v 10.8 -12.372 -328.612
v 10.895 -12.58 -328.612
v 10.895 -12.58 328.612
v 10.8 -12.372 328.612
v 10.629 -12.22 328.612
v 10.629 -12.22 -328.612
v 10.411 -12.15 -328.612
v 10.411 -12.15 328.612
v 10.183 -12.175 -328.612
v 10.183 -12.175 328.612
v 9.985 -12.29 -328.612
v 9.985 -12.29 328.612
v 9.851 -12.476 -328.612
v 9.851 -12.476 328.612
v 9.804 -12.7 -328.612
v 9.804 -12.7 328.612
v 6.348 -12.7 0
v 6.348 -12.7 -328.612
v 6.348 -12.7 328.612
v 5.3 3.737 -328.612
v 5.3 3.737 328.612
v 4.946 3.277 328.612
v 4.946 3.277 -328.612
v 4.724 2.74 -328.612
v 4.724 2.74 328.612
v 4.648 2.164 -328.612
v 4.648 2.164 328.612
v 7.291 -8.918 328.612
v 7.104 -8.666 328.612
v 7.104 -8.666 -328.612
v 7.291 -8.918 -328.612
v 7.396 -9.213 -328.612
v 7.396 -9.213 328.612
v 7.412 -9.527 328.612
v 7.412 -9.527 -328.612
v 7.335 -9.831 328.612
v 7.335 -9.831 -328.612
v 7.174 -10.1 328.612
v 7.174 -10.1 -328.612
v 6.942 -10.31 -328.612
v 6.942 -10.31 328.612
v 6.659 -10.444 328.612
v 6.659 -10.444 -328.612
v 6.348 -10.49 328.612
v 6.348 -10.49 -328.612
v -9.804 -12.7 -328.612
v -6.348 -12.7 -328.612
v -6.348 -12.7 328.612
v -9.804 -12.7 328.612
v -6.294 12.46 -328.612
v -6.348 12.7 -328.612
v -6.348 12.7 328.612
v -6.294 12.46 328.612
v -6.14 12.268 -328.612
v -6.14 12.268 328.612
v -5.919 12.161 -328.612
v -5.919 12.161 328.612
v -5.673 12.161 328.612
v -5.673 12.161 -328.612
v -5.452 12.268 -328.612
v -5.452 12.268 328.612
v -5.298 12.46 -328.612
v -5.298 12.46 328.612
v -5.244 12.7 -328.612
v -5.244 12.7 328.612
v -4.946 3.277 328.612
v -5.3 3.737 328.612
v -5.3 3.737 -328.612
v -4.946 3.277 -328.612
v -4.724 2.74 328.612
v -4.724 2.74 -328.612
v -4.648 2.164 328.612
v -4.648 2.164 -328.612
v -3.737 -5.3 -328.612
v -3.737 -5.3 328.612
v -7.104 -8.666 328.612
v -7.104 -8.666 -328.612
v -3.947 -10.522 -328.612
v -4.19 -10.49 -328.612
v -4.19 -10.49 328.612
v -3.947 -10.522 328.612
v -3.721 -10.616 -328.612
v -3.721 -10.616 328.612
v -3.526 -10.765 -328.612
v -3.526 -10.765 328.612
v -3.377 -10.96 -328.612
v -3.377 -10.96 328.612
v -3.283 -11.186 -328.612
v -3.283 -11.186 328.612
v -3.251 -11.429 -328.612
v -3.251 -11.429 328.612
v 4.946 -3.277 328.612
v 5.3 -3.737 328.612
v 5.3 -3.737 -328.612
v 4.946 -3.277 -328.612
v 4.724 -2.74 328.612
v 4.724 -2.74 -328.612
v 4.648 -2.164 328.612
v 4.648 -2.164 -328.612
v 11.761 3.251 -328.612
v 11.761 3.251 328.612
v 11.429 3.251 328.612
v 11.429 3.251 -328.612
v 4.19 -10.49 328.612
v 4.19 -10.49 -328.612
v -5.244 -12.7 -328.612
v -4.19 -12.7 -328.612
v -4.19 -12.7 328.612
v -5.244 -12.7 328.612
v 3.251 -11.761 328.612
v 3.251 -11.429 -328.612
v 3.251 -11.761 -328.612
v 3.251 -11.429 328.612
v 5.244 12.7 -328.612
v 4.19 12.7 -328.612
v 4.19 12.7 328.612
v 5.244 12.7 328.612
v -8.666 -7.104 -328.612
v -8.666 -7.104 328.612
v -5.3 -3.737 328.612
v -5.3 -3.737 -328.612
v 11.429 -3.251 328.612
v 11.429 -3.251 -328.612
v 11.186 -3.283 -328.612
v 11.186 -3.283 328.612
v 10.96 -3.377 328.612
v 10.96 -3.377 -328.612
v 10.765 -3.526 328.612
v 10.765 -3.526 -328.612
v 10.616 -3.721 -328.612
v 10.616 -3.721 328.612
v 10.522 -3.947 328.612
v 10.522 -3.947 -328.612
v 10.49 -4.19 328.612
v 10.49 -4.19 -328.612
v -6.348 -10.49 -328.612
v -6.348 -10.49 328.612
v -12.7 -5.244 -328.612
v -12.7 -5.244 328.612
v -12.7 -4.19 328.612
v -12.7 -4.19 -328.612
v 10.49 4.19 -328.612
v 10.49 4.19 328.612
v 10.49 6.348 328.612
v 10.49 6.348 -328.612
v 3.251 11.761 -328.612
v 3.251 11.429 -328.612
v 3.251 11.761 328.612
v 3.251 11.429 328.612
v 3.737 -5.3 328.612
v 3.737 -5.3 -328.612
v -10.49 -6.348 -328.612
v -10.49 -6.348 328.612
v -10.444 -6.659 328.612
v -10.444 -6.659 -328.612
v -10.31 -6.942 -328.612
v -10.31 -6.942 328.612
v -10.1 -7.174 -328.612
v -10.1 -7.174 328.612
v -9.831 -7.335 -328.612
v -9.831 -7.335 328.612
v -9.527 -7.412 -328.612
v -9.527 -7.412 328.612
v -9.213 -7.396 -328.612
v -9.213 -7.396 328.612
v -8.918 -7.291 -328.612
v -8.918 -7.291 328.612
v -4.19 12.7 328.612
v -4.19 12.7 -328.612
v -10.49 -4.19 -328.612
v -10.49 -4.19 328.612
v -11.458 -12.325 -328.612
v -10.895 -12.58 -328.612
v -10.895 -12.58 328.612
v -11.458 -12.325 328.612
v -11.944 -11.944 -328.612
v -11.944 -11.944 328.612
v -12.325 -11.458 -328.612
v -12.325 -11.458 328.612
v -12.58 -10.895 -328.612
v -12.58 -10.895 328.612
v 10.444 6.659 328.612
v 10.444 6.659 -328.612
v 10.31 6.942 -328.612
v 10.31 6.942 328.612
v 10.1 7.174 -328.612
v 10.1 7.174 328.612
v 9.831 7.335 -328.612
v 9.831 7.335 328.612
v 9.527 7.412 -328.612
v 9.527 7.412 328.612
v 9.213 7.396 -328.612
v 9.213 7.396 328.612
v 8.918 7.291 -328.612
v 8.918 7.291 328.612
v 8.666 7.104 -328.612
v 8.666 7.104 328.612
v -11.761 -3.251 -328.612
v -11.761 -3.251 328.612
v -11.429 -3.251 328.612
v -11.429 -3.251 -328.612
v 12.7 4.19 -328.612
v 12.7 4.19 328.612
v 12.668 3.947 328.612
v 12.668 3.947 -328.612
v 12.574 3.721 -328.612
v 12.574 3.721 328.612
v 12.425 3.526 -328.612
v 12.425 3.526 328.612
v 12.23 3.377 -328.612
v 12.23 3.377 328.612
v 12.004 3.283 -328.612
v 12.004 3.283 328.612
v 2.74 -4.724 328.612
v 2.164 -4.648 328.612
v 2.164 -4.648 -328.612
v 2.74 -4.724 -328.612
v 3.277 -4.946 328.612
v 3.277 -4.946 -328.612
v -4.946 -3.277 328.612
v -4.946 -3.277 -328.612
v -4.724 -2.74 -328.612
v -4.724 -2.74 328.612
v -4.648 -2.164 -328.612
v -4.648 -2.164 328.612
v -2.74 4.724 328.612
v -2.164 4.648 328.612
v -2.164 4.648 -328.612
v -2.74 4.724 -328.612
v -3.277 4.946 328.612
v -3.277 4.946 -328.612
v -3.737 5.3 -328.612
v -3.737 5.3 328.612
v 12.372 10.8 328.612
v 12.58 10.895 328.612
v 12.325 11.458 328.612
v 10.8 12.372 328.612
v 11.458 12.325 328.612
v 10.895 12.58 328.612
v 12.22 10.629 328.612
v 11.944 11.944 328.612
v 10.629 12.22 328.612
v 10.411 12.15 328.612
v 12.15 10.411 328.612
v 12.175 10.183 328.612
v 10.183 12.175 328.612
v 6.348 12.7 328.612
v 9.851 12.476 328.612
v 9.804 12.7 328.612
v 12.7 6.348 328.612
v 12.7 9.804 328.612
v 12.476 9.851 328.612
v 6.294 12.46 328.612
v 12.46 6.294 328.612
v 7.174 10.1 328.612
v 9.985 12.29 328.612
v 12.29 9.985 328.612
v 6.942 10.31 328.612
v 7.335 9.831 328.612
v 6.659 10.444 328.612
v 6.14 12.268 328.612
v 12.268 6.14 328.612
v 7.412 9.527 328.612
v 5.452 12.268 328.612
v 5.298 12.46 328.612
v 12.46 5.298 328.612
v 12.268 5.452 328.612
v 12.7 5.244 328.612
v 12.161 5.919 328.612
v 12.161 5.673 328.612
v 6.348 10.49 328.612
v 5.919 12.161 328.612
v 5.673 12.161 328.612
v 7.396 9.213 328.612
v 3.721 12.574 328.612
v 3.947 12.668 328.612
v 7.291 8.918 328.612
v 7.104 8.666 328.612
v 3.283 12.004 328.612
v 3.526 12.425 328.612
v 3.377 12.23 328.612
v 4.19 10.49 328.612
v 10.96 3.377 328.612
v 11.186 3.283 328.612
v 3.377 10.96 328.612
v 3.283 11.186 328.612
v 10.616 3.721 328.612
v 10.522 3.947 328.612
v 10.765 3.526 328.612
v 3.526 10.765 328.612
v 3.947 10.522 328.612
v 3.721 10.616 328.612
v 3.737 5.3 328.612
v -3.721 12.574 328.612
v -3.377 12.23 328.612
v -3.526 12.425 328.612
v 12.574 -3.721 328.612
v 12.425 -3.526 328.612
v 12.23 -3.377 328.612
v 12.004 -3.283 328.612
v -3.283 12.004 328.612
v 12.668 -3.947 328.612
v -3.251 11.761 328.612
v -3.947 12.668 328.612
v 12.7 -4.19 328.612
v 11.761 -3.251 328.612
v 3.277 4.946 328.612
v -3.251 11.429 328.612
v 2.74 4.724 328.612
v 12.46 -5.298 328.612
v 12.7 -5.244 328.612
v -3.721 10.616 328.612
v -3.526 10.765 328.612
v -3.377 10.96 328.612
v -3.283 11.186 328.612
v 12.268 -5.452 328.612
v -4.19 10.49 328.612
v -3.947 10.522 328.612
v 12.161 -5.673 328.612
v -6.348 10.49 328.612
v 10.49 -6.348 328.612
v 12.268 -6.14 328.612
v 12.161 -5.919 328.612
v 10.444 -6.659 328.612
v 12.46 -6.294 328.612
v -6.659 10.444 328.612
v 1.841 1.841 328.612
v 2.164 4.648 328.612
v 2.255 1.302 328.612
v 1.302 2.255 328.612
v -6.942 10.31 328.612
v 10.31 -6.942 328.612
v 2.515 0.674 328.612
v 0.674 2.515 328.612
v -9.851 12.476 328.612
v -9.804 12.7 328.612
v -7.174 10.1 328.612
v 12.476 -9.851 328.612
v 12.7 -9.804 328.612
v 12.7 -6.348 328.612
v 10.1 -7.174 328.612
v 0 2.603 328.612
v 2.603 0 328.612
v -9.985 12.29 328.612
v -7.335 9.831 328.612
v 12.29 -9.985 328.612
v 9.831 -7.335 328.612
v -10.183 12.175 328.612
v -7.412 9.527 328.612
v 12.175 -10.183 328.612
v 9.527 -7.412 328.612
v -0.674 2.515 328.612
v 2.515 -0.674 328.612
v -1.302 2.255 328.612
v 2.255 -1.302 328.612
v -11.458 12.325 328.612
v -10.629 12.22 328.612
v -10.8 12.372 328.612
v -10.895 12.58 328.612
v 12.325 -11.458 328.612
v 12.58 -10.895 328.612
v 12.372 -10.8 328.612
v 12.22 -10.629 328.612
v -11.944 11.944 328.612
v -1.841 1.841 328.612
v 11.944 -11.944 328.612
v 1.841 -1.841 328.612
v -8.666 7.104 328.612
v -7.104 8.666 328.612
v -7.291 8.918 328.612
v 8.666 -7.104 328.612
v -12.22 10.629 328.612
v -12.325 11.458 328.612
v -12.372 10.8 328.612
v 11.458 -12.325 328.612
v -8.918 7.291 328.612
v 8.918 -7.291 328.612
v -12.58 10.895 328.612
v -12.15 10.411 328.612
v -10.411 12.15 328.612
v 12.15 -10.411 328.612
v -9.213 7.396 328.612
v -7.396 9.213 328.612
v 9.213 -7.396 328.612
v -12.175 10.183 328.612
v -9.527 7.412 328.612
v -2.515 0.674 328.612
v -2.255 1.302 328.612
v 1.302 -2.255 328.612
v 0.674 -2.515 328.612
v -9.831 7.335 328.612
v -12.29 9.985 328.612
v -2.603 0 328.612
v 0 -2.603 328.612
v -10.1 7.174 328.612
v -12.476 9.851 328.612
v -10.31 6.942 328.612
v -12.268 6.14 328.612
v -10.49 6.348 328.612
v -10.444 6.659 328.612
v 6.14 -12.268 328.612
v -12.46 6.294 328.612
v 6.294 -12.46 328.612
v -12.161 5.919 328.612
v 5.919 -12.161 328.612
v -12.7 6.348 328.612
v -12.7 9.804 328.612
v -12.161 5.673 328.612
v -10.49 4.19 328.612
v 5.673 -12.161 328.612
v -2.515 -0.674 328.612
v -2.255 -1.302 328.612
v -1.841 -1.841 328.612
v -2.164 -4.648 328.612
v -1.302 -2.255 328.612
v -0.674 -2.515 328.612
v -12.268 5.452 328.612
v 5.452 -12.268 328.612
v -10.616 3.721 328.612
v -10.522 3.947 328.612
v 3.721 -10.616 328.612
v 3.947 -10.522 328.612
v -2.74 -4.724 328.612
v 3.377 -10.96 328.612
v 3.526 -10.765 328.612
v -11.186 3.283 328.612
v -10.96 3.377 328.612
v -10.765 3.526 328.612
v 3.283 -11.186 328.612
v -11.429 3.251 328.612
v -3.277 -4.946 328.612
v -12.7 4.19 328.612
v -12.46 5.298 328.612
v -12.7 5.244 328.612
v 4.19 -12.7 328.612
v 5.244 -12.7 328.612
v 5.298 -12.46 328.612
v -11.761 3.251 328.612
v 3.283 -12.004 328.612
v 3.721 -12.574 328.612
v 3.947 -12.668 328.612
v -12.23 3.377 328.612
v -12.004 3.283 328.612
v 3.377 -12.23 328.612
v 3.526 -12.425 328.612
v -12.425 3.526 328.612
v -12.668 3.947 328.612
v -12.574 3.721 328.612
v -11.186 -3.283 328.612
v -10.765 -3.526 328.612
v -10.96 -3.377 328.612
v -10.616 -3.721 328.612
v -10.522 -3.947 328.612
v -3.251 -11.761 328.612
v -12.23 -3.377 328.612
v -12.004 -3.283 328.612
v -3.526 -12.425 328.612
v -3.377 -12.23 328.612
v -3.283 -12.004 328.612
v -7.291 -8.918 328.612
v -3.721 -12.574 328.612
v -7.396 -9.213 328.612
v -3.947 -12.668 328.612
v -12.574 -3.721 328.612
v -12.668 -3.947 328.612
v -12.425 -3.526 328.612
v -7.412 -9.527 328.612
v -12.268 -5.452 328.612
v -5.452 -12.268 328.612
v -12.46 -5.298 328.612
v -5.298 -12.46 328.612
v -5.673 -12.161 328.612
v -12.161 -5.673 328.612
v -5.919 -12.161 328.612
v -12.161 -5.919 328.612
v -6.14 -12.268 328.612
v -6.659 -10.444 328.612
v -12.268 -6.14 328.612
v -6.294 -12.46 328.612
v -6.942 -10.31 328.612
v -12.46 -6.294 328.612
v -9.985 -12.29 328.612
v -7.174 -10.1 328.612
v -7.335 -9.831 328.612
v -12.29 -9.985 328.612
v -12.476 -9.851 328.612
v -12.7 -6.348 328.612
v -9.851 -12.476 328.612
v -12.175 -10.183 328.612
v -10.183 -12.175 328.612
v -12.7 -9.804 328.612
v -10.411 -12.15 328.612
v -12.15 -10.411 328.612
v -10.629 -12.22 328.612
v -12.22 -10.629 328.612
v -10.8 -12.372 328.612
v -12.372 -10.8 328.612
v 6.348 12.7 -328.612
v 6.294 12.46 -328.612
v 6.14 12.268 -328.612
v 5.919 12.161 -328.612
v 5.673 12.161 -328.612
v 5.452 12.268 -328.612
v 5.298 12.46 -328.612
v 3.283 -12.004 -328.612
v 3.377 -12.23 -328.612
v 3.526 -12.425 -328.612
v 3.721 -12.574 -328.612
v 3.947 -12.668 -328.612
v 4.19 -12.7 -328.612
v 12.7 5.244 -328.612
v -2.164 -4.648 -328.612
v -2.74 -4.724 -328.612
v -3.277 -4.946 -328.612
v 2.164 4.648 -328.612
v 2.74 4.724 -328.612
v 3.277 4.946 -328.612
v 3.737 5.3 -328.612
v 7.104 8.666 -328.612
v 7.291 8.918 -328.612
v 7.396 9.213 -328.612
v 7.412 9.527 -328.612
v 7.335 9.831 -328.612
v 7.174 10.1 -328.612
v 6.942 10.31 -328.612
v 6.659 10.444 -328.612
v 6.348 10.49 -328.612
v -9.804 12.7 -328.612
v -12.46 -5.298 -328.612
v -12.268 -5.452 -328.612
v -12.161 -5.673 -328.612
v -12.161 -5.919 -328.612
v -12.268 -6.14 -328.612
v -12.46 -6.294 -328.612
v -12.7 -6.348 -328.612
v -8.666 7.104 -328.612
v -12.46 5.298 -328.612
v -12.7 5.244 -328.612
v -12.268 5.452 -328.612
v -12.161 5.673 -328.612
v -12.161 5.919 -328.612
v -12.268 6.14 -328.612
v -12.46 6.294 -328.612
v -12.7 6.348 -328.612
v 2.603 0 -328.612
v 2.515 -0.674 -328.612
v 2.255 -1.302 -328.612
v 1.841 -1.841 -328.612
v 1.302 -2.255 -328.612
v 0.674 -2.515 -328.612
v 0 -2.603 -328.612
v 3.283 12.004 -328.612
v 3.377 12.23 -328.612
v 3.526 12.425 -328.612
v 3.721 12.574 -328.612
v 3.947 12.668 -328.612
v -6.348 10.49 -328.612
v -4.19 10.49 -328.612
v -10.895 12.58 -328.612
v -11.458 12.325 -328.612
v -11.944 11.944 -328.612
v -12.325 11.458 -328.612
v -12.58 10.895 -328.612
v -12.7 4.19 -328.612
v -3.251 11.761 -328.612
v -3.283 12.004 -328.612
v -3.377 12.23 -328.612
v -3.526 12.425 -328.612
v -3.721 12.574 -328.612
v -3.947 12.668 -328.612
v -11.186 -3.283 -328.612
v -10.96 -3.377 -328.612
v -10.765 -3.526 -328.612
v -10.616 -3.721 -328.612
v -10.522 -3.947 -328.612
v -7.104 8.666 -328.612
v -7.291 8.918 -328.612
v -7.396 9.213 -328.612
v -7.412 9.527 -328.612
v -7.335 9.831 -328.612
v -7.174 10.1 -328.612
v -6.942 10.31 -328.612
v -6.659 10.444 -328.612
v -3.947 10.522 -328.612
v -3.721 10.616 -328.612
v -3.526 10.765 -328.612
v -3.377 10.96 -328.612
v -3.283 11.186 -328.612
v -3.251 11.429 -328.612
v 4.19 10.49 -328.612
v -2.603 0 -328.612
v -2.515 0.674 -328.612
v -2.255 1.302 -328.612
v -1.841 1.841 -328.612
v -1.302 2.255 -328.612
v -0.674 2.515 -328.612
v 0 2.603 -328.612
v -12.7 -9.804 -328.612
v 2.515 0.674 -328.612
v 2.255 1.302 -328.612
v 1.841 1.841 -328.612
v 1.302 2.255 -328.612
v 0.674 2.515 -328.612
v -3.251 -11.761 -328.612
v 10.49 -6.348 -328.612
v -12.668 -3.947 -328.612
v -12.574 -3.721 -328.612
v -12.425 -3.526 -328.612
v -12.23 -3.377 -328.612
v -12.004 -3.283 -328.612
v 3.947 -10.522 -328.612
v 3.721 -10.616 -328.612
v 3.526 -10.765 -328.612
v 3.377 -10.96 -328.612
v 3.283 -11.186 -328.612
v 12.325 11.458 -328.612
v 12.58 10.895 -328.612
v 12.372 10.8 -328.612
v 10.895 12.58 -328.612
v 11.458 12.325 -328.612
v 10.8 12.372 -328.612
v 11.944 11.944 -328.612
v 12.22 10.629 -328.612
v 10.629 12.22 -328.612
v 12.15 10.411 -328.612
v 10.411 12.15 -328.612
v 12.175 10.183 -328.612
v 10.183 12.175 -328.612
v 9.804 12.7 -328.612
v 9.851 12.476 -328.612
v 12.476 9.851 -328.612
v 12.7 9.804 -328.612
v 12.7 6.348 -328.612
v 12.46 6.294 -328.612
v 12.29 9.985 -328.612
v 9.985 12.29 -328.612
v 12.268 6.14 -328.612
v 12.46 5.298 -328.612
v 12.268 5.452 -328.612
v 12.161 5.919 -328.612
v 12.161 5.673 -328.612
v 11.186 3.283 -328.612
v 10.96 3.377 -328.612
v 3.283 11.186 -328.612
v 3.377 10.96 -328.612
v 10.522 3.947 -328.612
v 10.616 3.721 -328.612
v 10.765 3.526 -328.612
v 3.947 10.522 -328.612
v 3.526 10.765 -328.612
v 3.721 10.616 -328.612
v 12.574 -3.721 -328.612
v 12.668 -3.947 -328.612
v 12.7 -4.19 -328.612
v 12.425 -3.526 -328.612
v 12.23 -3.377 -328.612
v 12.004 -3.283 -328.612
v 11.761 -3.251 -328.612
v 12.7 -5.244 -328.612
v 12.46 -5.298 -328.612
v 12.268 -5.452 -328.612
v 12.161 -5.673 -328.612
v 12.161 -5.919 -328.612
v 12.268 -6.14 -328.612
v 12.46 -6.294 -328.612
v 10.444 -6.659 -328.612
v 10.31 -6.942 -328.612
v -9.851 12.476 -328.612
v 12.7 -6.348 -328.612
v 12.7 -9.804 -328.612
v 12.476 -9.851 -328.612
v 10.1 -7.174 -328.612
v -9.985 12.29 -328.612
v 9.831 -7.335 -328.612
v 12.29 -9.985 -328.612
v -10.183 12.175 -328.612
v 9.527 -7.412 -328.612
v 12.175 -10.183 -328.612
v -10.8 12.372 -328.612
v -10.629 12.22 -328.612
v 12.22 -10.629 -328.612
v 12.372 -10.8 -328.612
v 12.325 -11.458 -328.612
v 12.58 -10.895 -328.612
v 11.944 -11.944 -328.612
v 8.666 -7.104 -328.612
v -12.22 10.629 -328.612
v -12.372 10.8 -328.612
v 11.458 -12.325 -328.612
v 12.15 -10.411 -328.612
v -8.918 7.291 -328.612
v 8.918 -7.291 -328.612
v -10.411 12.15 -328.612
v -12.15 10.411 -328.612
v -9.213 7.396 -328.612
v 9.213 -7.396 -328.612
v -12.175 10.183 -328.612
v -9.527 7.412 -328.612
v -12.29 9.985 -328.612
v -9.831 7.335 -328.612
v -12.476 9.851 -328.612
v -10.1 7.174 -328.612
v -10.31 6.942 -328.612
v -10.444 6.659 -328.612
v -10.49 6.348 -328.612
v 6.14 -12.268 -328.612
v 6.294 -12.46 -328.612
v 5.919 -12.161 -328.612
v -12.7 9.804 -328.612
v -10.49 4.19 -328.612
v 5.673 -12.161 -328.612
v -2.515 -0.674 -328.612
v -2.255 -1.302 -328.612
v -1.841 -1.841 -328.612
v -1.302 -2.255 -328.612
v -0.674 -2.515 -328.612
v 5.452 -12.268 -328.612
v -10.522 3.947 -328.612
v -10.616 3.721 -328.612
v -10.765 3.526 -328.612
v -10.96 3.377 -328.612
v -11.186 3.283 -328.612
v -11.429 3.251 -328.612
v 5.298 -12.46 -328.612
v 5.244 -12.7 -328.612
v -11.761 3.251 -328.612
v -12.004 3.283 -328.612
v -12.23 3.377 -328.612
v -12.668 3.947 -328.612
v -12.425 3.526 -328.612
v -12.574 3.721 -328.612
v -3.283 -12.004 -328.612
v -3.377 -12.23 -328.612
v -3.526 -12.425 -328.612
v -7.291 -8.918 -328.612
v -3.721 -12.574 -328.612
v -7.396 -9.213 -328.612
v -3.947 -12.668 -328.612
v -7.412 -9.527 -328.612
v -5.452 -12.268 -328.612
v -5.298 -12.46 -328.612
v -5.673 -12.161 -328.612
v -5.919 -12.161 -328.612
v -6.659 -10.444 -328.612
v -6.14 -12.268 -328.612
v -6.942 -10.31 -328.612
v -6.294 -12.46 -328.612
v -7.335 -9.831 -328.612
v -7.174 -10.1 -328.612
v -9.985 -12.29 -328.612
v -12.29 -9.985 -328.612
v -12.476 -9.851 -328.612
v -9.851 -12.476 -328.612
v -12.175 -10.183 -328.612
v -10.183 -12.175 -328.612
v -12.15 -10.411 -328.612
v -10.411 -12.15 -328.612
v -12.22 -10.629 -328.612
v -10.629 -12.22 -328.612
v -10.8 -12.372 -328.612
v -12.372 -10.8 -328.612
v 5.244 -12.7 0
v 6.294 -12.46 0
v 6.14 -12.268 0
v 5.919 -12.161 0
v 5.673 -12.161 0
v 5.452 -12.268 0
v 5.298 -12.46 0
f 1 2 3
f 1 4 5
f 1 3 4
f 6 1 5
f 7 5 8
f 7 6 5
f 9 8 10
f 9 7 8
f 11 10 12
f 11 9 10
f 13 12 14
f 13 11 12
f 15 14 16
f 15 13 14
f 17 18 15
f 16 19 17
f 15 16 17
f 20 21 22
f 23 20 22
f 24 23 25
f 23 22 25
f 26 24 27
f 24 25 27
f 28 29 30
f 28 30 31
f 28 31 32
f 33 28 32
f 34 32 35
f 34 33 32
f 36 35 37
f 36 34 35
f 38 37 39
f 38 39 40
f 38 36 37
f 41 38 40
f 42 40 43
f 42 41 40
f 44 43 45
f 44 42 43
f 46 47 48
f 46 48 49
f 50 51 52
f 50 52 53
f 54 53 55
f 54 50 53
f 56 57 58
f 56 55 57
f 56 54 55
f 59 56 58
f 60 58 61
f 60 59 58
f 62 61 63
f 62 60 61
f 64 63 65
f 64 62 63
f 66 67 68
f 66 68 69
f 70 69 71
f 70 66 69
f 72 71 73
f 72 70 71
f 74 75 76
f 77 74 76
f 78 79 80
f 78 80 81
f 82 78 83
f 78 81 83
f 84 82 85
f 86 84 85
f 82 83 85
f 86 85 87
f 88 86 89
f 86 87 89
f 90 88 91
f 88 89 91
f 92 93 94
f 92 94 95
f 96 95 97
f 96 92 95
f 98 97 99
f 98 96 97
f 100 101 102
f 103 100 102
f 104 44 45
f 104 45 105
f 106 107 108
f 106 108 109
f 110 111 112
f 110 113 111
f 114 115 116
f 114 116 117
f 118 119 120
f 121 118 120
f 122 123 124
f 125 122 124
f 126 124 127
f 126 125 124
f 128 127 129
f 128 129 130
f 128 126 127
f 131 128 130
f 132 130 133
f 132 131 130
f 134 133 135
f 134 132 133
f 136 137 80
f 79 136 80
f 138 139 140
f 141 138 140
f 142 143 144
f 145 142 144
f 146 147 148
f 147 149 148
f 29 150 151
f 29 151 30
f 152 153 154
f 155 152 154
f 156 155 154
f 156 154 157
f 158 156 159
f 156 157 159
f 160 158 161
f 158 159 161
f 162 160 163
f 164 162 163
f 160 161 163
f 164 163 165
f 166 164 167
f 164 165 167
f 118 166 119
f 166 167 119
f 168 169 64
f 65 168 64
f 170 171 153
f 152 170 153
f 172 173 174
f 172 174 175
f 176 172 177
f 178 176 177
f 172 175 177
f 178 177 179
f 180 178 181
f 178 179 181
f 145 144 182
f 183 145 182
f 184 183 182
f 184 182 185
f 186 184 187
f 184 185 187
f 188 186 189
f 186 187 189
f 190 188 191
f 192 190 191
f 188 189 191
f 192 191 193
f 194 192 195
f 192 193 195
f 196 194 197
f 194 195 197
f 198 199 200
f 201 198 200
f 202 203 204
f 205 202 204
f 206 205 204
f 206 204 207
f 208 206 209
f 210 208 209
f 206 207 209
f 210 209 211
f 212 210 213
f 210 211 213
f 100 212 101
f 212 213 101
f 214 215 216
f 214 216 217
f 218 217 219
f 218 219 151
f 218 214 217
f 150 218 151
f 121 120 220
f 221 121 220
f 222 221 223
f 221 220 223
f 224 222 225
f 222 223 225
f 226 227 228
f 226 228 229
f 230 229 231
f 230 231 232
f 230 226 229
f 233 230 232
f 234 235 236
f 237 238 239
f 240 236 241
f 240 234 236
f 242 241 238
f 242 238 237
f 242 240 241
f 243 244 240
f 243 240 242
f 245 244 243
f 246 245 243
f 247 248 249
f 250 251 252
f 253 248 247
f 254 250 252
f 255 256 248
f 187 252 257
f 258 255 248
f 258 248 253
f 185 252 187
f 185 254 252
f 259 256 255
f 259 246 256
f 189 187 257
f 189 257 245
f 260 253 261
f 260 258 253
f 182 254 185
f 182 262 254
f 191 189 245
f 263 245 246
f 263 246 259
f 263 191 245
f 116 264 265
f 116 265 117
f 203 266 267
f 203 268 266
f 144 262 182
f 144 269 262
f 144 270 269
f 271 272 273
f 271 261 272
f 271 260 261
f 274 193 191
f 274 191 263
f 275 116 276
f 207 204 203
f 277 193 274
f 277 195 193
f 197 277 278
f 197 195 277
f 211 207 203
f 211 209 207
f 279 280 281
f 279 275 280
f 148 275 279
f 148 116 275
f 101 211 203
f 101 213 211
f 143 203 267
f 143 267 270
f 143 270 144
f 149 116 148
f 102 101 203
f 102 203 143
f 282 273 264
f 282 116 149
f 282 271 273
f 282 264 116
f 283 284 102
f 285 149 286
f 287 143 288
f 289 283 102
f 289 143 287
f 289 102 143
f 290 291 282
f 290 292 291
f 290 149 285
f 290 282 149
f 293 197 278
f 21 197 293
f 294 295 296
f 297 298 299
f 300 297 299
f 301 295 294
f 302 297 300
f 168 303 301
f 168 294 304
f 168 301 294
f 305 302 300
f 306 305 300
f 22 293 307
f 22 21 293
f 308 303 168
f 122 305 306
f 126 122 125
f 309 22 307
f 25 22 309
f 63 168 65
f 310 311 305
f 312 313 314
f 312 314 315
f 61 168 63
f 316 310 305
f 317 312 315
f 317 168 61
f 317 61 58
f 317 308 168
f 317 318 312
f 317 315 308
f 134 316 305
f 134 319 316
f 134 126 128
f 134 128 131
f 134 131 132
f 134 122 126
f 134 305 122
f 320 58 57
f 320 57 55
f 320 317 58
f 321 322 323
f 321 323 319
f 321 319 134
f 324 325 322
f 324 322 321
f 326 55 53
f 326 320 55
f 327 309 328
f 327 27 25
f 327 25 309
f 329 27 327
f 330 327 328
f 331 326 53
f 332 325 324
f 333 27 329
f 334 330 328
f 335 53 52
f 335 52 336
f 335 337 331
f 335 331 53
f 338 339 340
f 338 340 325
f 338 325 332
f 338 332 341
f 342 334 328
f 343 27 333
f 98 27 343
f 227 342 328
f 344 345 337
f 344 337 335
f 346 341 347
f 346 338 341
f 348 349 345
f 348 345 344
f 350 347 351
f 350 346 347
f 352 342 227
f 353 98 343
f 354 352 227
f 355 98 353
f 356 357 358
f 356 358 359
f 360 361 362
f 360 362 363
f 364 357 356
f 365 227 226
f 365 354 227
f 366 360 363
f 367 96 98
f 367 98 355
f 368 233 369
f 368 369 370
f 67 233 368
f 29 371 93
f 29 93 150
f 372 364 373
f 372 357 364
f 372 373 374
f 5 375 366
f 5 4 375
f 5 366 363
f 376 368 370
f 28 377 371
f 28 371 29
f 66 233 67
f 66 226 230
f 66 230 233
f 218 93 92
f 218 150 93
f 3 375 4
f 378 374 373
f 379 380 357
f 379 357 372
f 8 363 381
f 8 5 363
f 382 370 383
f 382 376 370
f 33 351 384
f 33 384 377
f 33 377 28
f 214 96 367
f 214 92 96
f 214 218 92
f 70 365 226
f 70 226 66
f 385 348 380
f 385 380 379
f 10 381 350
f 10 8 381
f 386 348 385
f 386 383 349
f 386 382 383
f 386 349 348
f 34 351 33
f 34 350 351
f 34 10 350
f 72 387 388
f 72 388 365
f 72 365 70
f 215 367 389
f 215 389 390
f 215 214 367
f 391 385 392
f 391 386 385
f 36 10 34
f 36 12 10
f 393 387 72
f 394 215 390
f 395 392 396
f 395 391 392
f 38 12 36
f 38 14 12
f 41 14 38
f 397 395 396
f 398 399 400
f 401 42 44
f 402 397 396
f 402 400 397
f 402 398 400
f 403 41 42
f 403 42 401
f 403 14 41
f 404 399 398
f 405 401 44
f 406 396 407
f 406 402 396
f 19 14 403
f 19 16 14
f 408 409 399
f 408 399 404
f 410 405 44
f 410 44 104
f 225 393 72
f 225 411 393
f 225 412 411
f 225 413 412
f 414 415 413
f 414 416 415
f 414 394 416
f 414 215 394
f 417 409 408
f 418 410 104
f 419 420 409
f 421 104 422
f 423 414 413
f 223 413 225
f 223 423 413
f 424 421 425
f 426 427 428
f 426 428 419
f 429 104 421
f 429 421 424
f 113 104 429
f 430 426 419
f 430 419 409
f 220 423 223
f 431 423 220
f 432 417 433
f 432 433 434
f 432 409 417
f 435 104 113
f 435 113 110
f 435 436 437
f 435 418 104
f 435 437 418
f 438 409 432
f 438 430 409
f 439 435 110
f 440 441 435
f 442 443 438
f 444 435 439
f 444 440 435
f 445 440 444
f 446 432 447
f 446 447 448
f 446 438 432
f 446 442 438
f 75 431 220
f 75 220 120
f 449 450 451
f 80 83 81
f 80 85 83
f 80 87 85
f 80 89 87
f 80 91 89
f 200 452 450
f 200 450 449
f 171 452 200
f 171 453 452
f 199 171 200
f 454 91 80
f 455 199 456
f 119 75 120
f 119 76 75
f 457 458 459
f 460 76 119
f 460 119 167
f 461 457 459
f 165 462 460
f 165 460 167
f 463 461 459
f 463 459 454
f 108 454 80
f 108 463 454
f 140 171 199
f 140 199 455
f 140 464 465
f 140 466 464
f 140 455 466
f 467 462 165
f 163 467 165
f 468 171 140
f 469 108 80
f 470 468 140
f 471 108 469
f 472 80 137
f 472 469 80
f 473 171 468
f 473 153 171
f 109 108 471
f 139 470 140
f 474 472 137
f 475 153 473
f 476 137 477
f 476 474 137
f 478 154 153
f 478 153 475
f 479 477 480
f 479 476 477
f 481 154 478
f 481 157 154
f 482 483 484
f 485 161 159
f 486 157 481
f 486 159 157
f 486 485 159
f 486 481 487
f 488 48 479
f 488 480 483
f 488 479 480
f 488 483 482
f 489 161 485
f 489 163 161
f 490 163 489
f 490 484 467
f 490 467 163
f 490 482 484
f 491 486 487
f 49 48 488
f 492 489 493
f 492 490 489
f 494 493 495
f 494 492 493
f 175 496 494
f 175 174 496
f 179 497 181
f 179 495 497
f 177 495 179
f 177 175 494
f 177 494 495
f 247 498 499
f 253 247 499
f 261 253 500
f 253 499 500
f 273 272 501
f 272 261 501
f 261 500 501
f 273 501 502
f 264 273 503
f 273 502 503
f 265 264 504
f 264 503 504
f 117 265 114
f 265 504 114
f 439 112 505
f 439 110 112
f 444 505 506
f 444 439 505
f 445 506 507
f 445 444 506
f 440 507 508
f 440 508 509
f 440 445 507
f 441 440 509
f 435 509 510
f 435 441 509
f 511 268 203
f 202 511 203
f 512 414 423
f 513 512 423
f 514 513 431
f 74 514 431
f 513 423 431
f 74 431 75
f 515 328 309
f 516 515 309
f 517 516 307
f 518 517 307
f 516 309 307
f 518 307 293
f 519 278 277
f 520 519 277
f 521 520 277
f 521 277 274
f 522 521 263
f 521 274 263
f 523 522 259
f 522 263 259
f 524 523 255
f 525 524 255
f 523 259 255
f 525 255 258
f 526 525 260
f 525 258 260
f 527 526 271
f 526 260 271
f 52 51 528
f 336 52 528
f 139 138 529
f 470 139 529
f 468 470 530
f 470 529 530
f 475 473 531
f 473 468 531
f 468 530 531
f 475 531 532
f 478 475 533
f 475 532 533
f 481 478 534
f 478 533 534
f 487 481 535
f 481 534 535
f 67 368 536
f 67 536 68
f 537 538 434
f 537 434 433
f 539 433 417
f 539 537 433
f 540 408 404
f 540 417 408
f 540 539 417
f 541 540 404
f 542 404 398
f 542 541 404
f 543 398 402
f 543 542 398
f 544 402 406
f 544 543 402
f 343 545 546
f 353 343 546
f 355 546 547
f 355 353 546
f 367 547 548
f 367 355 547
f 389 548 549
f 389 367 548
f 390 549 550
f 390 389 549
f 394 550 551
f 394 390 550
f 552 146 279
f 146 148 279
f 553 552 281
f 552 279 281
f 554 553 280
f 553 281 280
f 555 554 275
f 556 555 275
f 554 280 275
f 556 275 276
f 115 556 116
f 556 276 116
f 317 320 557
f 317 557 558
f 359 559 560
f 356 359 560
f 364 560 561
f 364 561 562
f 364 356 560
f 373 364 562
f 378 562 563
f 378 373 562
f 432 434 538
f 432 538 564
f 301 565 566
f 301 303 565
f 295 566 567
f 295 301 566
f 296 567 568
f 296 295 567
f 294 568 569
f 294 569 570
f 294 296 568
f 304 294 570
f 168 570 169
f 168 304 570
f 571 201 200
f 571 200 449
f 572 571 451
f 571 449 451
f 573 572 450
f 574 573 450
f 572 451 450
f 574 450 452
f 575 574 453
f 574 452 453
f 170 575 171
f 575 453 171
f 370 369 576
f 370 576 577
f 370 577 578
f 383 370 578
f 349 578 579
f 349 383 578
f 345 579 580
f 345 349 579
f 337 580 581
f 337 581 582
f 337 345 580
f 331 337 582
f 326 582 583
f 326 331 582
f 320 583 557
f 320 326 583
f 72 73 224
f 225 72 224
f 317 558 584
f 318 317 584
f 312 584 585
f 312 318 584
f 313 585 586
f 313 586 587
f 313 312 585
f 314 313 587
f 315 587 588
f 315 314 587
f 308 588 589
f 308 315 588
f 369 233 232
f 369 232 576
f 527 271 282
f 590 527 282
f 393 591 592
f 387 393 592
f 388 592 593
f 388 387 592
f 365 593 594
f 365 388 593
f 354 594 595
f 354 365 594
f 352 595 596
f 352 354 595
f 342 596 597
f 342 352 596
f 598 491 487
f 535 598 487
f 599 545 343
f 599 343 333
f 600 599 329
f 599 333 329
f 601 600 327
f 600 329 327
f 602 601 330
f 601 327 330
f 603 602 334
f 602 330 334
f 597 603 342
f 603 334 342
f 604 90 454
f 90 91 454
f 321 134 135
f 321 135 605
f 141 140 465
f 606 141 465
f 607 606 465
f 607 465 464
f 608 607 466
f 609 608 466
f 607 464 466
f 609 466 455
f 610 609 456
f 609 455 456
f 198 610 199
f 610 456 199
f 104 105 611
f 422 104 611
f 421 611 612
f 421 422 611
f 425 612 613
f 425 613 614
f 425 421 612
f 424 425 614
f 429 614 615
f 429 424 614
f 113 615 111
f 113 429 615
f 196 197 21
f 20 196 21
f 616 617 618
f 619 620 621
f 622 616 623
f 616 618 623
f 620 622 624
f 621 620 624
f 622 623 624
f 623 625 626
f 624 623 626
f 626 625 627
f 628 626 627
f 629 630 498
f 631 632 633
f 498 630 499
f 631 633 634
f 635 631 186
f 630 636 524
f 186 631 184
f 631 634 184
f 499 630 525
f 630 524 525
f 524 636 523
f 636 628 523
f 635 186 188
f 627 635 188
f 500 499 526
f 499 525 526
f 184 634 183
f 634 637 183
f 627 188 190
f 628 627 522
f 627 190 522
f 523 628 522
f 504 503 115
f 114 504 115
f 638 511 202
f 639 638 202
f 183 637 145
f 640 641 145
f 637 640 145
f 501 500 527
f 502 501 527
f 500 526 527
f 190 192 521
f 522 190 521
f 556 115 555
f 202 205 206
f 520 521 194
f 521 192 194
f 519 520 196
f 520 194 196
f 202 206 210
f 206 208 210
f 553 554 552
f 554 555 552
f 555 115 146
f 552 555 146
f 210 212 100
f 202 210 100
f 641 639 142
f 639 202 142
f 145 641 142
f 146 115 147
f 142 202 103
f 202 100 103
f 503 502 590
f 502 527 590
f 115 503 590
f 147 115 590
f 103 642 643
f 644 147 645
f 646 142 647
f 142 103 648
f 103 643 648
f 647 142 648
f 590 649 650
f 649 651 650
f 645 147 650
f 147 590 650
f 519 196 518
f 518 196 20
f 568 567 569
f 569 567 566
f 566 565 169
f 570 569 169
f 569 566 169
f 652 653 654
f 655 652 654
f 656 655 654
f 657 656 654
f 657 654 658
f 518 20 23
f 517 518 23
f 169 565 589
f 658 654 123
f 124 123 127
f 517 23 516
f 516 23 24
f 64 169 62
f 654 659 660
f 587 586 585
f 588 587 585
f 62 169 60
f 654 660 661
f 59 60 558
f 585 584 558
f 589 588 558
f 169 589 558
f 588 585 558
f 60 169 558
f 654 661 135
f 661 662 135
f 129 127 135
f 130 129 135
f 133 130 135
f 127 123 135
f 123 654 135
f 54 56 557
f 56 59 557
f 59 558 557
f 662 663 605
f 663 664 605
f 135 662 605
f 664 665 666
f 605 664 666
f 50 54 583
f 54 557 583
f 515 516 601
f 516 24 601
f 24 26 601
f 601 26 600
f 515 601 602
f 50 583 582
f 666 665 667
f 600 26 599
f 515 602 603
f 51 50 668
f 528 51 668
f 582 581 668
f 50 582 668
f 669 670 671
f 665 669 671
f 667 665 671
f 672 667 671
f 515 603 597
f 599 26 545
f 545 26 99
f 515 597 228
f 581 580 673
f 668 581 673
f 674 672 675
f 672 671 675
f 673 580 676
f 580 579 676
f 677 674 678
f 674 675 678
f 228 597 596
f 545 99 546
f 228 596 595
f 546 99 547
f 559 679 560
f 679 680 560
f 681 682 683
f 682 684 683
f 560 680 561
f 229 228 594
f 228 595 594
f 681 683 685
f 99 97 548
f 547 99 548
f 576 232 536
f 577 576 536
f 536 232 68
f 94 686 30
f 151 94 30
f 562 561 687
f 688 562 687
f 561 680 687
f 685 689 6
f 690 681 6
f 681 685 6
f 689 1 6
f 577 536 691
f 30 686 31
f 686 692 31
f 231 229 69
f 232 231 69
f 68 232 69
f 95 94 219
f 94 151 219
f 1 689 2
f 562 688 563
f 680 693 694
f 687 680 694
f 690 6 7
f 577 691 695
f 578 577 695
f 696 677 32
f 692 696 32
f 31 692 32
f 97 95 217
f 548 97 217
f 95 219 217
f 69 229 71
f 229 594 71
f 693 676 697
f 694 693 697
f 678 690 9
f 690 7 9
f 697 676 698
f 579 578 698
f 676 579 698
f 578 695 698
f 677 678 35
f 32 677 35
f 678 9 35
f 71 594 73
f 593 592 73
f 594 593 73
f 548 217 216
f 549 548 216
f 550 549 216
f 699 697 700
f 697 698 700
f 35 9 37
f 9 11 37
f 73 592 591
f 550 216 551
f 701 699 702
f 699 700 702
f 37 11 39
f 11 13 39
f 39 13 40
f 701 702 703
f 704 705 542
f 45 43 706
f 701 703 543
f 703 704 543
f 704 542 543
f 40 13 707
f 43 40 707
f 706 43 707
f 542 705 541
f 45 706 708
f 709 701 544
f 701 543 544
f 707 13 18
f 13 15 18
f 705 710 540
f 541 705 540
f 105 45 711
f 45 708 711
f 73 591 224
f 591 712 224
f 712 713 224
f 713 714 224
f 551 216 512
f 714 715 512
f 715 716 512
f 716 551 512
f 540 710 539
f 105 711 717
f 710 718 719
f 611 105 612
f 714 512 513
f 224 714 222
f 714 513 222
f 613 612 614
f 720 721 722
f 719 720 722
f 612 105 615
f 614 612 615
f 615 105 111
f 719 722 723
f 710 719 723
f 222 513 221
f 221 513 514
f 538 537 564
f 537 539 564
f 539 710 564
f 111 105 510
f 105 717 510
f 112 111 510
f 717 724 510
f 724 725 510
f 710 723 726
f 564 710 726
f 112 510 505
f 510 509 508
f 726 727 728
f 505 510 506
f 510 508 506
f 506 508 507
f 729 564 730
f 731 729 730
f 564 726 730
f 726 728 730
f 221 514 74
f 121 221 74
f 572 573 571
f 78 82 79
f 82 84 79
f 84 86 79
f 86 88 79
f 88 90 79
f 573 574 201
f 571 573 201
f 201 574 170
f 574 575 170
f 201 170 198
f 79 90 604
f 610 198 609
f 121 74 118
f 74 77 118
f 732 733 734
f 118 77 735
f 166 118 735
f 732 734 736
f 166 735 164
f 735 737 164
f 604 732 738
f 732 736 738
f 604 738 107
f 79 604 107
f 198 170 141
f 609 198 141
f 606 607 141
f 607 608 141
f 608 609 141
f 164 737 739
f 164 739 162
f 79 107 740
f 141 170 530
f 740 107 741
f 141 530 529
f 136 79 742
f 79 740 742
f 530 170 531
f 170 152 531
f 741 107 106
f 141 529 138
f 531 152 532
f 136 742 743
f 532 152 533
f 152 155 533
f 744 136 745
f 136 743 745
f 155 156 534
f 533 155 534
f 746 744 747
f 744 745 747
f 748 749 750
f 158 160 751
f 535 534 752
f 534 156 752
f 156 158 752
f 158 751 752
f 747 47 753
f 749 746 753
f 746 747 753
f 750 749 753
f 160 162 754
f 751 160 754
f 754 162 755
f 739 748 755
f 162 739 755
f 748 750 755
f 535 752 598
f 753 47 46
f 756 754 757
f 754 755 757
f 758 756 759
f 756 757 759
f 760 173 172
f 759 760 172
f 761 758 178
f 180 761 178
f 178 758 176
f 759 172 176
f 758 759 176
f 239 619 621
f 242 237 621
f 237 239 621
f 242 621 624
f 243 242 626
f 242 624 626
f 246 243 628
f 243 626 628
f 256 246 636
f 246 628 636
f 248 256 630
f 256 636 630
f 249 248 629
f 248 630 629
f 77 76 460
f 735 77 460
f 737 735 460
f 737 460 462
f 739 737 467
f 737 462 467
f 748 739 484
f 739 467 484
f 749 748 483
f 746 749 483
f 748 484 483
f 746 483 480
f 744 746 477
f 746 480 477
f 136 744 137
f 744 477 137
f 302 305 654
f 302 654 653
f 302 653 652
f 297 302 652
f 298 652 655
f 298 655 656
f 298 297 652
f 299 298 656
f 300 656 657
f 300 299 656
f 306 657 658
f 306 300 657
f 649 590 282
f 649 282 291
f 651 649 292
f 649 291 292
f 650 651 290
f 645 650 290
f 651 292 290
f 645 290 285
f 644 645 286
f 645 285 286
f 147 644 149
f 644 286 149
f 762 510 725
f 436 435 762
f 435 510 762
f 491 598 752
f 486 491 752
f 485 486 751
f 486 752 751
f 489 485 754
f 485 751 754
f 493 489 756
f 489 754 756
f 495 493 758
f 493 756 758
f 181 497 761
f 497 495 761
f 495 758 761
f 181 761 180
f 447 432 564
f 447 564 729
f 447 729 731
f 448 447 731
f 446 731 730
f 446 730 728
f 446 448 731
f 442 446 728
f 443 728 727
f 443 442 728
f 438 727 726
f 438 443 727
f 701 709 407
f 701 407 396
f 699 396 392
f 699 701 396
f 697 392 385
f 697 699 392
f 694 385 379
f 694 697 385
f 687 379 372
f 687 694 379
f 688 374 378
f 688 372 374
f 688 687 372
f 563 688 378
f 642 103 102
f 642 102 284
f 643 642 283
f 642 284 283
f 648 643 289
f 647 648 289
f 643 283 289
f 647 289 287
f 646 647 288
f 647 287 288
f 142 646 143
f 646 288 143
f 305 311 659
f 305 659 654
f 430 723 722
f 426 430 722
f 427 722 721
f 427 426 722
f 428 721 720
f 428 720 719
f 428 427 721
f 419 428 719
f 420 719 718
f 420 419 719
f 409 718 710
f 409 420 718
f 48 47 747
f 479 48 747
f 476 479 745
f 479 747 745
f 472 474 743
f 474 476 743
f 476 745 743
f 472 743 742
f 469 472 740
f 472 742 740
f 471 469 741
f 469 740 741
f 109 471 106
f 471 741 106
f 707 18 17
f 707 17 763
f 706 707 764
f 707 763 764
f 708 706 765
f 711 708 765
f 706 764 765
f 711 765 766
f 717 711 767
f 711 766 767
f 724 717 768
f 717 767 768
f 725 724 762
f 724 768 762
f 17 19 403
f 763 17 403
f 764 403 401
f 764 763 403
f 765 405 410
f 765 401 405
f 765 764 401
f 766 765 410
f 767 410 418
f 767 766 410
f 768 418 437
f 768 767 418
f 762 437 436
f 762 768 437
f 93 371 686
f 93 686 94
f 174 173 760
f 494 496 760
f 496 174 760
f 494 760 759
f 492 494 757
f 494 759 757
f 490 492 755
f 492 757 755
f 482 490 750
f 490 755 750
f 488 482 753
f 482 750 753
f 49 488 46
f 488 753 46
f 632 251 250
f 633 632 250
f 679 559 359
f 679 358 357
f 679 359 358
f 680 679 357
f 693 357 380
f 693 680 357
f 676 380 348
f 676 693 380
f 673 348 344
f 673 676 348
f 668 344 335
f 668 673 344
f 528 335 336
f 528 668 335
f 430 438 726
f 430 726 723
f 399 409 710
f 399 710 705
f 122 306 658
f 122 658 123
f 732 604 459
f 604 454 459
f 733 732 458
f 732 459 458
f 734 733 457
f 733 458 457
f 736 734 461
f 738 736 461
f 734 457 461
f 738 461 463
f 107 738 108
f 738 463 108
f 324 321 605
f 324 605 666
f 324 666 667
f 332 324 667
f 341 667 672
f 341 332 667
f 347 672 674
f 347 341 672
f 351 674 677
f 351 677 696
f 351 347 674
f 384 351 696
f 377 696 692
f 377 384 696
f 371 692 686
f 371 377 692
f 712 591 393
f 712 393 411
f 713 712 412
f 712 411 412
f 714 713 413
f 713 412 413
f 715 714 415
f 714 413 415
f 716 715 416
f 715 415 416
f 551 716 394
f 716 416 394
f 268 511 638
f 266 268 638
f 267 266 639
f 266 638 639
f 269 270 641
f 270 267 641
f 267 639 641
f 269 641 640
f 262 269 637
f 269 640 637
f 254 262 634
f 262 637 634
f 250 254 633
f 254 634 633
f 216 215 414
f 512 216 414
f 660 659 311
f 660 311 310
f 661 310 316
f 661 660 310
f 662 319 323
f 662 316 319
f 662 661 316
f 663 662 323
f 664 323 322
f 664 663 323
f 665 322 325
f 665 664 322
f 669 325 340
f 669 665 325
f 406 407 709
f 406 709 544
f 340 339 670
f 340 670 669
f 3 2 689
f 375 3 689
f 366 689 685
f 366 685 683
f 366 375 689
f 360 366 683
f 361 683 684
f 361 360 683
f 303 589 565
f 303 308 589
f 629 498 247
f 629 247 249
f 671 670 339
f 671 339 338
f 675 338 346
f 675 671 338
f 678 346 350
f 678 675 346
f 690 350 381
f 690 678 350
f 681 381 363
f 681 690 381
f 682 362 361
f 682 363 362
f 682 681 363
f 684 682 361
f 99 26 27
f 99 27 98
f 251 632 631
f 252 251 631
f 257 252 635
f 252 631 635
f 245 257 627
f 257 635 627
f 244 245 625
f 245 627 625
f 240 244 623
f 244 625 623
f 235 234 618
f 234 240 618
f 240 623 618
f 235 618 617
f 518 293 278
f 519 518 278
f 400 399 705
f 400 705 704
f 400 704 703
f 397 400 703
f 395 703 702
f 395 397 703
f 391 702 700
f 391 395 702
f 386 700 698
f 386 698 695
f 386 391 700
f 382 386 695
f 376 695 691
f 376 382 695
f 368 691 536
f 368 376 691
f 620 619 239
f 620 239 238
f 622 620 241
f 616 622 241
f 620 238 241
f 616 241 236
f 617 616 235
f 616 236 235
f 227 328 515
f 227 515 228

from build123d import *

# Parameters (mm, degrees)
BOSS_EXTRUDE1_DEPTH     = 328.6125
SKETCH5_R               = 0.55245
CUT_EXTRUDE1_DEPTH      = 329.6125
CUT_EXTRUDE1_DEPTH_BACK = 329.6125


with BuildPart() as part:
    # Sketch4 → Boss-Extrude1 (new body, symmetric)
    with BuildSketch(Plane.XY):
        with BuildLine():
            Line((4.190365, -12.7), (10.11729625, -12.7))
            ThreePointArc((10.11729625, -12.7), (11.943543585, -11.943543585), (12.7, -10.11729625))
            Line((12.7, -10.11729625), (12.7, -4.190365))
            ThreePointArc((12.7, -4.190365), (12.42492494, -3.52627506), (11.760835, -3.2512))
            Line((11.760835, -3.2512), (11.429365, -3.2512))
            ThreePointArc((11.429365, -3.2512), (10.76527506, -3.52627506), (10.4902, -4.190365))
            Line((10.4902, -4.190365), (10.4902, -6.348478019))
            ThreePointArc((10.4902, -6.348478019), (9.830707141, -7.335478831), (8.666460301, -7.103895736))
            Line((8.666460301, -7.103895736), (5.299899128, -3.737334563))
            ThreePointArc((5.299899128, -3.737334563), (4.817571085, -3.015479634), (4.6482, -2.16399369))
            Line((4.6482, -2.16399369), (4.6482, 0))
            Line((4.6482, 0), (2.6035, 0))
            ThreePointArc((2.6035, 0), (1.840952505, -1.840952505), (0, -2.6035))
            Line((0, -2.6035), (0, -4.6482))
            Line((0, -4.6482), (2.16399369, -4.6482))
            ThreePointArc((2.16399369, -4.6482), (3.015479634, -4.817571085), (3.737334563, -5.299899128))
            Line((3.737334563, -5.299899128), (7.103895736, -8.666460301))
            ThreePointArc((7.103895736, -8.666460301), (7.335478831, -9.830707141), (6.348478019, -10.4902))
            Line((6.348478019, -10.4902), (4.190365, -10.4902))
            ThreePointArc((4.190365, -10.4902), (3.52627506, -10.76527506), (3.2512, -11.429365))
            Line((3.2512, -11.429365), (3.2512, -11.760835))
            ThreePointArc((3.2512, -11.760835), (3.52627506, -12.42492494), (4.190365, -12.7))
        make_face()
    extrude(amount=BOSS_EXTRUDE1_DEPTH, both=True)

    # Sketch5 → Cut-Extrude1 (cut, two sides)
    with BuildSketch(Plane.XY) as cut_extrude1_sk:
        with Locations((10.356153152, -12.7)):
            Circle(SKETCH5_R)
        with Locations((5.796028019, -12.7)):
            Circle(SKETCH5_R)
        with Locations((12.7, -10.356153152)):
            Circle(SKETCH5_R)
        with Locations((12.7, -5.796028019)):
            Circle(SKETCH5_R)
    extrude(amount=CUT_EXTRUDE1_DEPTH, mode=Mode.SUBTRACT)
    extrude(cut_extrude1_sk.sketch, amount=-CUT_EXTRUDE1_DEPTH_BACK, mode=Mode.SUBTRACT)

    # Mirror1: part across plane


with BuildPart() as part_1:
    add(part.part)
    add(part.part.mirror(Plane(origin=(0, 0, 0), x_dir=(0, 0, 1), z_dir=(1, 0, 0))))

    # Mirror2: part across plane


with BuildPart() as part_2:
    add(part_1.part)
    add(part_1.part.mirror(Plane.ZX))


solid = part_2.part
